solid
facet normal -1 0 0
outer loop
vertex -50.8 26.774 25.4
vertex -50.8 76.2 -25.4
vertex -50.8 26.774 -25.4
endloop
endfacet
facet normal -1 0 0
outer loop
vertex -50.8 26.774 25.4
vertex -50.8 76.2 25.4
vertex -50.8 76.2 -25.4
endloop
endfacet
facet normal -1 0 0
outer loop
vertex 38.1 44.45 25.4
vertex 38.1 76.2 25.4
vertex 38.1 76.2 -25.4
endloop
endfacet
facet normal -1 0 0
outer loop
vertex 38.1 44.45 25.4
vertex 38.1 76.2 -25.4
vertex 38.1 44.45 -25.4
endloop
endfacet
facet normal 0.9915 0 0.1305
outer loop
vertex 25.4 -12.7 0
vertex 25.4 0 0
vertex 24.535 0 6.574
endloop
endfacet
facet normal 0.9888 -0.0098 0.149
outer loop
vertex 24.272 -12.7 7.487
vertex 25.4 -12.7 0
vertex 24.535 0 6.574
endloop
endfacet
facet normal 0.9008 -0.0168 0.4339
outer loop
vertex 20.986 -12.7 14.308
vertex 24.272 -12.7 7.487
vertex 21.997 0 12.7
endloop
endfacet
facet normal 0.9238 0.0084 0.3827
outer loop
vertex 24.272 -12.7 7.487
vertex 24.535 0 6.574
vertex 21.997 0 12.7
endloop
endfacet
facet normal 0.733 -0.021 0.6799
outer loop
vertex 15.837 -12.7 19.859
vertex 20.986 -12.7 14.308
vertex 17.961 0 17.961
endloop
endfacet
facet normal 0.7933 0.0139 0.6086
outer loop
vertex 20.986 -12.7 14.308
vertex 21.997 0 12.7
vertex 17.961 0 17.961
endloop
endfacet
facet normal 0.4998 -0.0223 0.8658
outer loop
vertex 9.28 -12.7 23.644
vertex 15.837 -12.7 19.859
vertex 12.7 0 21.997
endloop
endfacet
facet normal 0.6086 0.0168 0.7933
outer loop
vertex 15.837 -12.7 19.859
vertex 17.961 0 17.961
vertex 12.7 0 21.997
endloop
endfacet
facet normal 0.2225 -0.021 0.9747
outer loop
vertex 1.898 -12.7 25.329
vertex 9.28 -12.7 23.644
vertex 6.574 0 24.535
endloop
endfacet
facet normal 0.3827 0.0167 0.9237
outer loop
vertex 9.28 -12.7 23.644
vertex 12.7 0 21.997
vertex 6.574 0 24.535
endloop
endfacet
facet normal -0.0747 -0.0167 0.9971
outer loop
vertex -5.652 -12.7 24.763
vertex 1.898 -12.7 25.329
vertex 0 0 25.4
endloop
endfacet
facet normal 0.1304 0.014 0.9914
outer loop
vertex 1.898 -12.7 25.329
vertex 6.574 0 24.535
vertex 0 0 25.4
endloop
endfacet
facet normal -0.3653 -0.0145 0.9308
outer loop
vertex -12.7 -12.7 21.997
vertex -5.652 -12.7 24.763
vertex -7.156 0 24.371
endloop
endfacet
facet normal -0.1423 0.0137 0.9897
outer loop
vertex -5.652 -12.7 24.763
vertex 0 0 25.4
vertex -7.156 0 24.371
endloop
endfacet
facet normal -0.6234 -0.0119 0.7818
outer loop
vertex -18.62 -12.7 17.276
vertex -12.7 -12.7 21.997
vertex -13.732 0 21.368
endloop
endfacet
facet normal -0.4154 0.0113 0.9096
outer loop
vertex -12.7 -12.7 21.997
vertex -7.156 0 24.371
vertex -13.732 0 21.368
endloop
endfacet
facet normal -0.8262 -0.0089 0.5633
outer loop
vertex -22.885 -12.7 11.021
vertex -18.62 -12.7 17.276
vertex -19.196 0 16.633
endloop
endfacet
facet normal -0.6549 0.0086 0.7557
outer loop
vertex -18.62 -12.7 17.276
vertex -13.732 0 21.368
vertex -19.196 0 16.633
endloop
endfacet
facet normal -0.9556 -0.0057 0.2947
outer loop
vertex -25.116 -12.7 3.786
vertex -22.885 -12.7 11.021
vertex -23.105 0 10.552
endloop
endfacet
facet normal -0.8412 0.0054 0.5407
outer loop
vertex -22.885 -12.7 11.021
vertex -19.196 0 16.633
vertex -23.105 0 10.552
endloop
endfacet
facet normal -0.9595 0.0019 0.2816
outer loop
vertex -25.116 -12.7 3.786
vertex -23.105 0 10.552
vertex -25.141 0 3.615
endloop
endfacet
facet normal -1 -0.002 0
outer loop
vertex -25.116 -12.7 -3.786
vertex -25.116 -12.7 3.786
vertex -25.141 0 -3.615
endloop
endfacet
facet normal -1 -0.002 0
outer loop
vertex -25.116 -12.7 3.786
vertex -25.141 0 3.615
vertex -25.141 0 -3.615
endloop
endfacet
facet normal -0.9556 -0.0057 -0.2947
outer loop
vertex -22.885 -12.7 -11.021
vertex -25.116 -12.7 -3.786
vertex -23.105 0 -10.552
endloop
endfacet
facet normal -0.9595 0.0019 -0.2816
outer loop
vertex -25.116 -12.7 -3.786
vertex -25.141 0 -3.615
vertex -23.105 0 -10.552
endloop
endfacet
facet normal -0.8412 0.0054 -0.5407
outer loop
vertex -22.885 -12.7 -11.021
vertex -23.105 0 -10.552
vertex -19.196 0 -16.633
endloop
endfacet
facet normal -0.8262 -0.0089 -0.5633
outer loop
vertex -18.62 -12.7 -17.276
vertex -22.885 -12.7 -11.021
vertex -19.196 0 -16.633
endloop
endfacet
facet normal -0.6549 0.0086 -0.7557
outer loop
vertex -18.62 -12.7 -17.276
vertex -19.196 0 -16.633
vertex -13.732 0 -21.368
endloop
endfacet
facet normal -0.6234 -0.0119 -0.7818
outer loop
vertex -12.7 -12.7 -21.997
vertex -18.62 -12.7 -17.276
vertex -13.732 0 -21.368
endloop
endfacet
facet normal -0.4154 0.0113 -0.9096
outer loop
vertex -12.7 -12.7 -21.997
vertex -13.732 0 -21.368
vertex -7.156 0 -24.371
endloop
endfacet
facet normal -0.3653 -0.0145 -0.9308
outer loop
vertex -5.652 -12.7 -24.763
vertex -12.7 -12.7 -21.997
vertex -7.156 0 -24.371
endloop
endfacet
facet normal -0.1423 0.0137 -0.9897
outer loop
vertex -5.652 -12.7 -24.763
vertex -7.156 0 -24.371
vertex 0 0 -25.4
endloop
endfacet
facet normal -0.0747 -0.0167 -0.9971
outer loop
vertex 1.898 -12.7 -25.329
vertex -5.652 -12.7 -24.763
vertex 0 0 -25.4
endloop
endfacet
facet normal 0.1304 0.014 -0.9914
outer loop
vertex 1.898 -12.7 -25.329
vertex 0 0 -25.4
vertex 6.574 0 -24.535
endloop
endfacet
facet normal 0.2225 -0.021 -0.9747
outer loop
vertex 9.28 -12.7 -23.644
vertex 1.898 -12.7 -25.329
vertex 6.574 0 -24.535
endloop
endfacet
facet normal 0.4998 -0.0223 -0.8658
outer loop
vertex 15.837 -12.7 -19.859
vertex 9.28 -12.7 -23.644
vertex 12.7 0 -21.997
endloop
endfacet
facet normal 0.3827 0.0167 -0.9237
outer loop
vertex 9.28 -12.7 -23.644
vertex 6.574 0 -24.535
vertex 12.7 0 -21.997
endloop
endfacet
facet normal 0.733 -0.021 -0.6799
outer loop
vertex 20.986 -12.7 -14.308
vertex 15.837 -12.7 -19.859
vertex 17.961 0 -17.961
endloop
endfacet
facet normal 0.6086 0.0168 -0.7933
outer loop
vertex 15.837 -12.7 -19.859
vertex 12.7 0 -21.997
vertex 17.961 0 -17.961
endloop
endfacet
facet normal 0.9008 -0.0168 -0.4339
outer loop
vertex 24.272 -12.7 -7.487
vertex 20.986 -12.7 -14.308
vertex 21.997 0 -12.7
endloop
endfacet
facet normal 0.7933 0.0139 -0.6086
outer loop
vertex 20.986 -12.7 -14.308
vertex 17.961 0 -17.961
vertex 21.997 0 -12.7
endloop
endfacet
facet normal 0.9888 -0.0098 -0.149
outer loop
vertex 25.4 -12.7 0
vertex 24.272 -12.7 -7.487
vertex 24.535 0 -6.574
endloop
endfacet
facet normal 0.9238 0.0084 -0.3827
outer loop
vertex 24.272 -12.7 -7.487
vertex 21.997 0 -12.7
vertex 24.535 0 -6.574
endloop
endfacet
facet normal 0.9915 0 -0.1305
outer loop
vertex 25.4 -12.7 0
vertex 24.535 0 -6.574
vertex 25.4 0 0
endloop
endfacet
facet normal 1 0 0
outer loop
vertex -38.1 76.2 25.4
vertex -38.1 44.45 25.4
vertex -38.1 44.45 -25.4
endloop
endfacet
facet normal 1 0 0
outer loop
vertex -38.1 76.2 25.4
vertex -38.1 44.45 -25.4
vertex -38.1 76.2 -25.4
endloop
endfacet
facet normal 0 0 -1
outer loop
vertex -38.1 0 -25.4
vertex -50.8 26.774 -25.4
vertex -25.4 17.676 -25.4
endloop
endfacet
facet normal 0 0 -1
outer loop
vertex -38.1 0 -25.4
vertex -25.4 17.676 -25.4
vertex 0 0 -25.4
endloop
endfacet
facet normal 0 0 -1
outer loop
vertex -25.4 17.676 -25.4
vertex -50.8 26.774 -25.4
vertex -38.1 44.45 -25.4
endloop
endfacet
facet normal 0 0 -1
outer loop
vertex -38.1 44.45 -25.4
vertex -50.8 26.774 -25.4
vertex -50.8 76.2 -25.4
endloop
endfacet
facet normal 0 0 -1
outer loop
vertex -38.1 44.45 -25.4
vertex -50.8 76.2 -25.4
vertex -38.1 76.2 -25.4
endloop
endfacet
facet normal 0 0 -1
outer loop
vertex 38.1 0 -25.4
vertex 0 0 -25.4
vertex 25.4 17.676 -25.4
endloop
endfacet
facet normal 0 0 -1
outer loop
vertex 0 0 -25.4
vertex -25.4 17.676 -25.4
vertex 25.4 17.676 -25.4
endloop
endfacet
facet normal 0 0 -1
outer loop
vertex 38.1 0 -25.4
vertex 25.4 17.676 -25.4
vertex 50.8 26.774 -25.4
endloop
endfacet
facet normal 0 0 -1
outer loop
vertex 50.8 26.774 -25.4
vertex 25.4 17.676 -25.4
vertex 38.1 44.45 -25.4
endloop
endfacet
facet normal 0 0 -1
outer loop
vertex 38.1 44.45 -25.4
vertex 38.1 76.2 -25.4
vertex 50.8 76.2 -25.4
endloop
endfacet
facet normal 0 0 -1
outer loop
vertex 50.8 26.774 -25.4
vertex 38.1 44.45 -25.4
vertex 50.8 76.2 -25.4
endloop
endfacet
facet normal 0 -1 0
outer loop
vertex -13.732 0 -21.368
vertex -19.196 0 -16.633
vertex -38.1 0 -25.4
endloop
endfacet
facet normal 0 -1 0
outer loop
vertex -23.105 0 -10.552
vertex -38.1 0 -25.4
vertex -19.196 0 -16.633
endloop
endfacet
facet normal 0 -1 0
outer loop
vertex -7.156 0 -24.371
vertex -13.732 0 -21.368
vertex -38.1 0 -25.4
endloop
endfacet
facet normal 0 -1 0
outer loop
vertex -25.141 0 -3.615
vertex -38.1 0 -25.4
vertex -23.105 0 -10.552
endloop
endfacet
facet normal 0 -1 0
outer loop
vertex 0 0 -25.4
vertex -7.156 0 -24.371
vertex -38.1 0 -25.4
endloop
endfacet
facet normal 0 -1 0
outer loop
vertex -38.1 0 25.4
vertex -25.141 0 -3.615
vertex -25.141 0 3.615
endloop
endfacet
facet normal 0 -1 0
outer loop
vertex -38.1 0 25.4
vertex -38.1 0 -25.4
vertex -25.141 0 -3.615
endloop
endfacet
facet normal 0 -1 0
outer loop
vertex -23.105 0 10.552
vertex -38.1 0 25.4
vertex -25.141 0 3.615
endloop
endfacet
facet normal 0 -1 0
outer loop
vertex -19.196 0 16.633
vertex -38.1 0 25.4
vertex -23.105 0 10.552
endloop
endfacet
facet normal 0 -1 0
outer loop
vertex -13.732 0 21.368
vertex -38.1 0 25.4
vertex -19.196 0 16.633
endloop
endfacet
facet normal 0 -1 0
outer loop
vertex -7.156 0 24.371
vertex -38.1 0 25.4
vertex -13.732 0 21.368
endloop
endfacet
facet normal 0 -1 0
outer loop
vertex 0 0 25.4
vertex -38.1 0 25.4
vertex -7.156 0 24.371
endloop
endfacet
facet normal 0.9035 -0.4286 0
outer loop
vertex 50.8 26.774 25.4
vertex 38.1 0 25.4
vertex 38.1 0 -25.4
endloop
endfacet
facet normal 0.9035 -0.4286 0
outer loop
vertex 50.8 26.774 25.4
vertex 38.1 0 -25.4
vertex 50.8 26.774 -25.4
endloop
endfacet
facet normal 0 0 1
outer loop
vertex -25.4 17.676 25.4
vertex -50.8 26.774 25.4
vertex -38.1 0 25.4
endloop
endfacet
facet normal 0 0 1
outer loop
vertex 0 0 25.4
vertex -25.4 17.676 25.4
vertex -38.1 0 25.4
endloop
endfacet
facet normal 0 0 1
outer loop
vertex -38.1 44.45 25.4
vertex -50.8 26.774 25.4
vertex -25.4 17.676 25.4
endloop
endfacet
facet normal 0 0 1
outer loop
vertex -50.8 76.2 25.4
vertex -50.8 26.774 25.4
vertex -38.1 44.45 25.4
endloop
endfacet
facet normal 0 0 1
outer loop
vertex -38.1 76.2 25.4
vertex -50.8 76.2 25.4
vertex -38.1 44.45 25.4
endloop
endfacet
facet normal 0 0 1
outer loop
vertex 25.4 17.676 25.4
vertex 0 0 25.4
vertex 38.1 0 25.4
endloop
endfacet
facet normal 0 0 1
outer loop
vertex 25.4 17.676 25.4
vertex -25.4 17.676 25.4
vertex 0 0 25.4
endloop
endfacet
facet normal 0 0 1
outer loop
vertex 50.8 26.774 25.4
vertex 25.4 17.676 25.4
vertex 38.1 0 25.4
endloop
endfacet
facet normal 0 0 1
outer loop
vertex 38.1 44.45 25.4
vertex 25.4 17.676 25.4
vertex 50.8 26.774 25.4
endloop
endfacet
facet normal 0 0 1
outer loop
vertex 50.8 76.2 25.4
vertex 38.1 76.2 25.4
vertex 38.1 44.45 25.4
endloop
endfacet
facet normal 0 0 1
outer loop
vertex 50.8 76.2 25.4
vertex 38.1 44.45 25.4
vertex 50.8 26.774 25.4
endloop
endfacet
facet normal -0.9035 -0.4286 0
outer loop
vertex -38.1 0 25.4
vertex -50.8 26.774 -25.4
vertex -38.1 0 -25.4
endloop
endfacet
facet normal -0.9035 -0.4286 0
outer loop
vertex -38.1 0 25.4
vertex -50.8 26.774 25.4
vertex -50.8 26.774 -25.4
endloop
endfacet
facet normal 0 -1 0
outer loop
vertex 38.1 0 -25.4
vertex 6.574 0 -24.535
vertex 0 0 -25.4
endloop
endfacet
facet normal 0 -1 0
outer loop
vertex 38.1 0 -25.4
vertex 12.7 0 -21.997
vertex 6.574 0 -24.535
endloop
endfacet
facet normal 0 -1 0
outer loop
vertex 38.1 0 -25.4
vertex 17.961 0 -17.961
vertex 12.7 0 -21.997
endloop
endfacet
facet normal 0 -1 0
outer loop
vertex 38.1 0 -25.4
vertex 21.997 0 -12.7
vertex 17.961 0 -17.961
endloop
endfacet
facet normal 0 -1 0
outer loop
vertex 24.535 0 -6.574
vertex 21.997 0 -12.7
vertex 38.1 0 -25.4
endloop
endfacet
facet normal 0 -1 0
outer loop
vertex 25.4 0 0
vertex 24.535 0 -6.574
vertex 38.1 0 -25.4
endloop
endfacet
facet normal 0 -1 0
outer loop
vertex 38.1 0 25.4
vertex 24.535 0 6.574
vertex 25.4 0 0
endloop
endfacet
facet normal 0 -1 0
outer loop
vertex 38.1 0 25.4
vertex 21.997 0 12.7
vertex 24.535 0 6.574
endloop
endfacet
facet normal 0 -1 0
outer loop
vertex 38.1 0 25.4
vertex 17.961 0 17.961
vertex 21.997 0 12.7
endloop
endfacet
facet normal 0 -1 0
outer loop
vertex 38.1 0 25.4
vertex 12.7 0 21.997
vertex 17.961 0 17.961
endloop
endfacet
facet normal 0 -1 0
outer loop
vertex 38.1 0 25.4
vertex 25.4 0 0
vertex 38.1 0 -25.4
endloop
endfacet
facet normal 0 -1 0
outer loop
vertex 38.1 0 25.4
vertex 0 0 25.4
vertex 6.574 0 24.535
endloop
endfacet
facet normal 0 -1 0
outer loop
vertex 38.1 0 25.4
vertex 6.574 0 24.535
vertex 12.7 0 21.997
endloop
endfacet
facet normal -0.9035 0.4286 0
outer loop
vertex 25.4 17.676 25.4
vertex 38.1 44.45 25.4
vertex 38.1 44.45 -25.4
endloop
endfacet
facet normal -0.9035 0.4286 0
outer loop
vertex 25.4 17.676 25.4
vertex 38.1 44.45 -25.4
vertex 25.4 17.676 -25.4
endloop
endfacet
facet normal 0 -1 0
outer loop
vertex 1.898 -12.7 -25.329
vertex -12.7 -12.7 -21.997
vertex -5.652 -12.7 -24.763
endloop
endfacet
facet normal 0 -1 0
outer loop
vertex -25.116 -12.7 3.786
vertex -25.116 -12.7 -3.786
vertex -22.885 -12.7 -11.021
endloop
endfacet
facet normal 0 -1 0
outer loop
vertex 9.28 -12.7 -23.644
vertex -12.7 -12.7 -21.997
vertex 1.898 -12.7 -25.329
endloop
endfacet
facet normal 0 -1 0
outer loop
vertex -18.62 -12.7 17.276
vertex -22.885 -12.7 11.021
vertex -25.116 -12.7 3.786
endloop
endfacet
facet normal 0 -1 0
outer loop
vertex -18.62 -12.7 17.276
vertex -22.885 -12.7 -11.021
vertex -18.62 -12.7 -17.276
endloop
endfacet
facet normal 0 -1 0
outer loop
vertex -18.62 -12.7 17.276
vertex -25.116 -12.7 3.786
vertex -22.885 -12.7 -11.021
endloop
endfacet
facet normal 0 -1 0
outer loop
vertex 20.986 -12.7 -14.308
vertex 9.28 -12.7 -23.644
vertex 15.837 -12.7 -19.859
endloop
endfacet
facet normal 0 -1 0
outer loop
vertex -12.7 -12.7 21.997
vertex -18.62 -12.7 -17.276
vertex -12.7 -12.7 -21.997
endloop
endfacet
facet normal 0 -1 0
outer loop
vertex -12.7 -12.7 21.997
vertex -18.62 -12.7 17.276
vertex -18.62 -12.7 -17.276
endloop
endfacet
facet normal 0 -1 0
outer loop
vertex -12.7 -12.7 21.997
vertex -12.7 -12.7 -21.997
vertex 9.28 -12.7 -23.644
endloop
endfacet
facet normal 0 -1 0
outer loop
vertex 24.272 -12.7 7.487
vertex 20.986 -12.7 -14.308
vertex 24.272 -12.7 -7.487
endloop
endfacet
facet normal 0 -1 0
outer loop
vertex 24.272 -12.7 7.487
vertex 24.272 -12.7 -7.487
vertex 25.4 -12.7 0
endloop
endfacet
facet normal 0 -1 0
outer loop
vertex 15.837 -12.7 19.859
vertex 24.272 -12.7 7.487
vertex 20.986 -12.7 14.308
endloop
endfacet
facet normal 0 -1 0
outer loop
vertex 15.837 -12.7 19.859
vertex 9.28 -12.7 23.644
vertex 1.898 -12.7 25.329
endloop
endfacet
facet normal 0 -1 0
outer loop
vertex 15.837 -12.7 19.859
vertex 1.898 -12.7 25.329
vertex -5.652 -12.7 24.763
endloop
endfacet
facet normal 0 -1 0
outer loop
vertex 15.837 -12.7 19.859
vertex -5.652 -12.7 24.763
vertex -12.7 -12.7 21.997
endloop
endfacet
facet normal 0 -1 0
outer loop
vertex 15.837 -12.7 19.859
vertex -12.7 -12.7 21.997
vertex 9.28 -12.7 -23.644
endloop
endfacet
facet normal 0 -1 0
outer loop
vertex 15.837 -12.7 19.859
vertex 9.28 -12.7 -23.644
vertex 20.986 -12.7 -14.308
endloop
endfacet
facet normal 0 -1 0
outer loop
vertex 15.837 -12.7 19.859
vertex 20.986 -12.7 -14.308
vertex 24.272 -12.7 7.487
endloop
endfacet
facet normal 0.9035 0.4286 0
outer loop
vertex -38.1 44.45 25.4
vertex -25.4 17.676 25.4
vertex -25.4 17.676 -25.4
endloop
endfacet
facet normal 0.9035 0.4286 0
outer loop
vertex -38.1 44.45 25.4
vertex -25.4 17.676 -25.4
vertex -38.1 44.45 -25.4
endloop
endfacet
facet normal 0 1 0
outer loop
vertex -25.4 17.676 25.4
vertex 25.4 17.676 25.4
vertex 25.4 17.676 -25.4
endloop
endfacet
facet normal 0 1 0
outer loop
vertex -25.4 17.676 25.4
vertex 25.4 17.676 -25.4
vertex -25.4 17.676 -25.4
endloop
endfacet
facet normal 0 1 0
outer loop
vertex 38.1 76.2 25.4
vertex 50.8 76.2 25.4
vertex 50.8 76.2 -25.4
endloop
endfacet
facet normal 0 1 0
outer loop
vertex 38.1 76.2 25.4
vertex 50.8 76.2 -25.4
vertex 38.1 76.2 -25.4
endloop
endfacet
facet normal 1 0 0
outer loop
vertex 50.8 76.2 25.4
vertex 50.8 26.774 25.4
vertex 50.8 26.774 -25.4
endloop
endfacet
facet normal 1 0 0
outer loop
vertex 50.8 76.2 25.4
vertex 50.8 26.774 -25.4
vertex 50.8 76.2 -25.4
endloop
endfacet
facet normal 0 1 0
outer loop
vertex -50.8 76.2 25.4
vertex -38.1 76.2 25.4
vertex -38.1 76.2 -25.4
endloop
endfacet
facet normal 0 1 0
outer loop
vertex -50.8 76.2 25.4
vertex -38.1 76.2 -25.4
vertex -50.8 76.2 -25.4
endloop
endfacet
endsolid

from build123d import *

# Parameters (mm, degrees)
BOSS_EXTRUDE1_DEPTH = 25.4
SKETCH2_R           = 25.4
BOSS_EXTRUDE2_DEPTH = 12.7


with BuildPart() as part:
    # Sketch1 → Boss-Extrude1 (new body, symmetric)
    with BuildSketch(Plane.XY):
        Polygon((-38.1, 0), (38.1, 0), (50.8, 26.773950856), (50.8, 76.2), (38.1, 76.2), (38.1, 44.45), (25.4, 17.676049144), (-25.4, 17.676049144), (-38.1, 44.45), (-38.1, 76.2), (-50.8, 76.2), (-50.8, 26.773950856), align=None)
    extrude(amount=BOSS_EXTRUDE1_DEPTH, both=True)

    # Sketch2 → Boss-Extrude2 (add)
    with BuildSketch(Plane.XZ):
        Circle(SKETCH2_R)
    extrude(amount=BOSS_EXTRUDE2_DEPTH)


solid = part.part
